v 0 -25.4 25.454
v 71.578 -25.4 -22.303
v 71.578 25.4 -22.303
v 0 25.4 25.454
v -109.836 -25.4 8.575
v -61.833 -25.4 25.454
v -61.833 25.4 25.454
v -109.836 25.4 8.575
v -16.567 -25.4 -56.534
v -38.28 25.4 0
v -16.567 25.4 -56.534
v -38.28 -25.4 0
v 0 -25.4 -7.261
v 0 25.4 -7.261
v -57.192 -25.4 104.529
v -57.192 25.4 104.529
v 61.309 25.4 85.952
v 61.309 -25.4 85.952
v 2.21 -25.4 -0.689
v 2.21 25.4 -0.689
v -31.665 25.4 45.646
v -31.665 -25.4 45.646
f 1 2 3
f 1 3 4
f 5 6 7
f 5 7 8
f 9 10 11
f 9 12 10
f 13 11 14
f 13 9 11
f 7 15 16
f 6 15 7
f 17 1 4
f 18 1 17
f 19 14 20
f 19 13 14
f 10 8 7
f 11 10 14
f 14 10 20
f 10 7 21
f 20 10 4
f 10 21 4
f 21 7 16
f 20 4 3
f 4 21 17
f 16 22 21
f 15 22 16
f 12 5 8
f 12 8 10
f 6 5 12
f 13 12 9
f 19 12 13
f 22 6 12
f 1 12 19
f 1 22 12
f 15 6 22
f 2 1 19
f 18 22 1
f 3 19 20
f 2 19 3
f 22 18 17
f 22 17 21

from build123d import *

# Parameters (mm, degrees)
F1_DEPTH = 25.4


with BuildPart() as f1:
    # F0 (on Front) → F1 (new body, symmetric)
    with BuildSketch(Plane.XZ):
        Polygon((0, -7.260618), (2.209697, -0.688518), (71.577795, -22.302875), (0, 25.454371), (61.308518, 85.952409), (-31.664561, 45.646154), (-57.191979, 104.529388), (-61.833249, 25.454371), (-109.835885, 8.574612), (-38.279932, 0), (-16.56682, -56.533791), align=None)
    extrude(amount=F1_DEPTH, both=True)


solid = f1.part
